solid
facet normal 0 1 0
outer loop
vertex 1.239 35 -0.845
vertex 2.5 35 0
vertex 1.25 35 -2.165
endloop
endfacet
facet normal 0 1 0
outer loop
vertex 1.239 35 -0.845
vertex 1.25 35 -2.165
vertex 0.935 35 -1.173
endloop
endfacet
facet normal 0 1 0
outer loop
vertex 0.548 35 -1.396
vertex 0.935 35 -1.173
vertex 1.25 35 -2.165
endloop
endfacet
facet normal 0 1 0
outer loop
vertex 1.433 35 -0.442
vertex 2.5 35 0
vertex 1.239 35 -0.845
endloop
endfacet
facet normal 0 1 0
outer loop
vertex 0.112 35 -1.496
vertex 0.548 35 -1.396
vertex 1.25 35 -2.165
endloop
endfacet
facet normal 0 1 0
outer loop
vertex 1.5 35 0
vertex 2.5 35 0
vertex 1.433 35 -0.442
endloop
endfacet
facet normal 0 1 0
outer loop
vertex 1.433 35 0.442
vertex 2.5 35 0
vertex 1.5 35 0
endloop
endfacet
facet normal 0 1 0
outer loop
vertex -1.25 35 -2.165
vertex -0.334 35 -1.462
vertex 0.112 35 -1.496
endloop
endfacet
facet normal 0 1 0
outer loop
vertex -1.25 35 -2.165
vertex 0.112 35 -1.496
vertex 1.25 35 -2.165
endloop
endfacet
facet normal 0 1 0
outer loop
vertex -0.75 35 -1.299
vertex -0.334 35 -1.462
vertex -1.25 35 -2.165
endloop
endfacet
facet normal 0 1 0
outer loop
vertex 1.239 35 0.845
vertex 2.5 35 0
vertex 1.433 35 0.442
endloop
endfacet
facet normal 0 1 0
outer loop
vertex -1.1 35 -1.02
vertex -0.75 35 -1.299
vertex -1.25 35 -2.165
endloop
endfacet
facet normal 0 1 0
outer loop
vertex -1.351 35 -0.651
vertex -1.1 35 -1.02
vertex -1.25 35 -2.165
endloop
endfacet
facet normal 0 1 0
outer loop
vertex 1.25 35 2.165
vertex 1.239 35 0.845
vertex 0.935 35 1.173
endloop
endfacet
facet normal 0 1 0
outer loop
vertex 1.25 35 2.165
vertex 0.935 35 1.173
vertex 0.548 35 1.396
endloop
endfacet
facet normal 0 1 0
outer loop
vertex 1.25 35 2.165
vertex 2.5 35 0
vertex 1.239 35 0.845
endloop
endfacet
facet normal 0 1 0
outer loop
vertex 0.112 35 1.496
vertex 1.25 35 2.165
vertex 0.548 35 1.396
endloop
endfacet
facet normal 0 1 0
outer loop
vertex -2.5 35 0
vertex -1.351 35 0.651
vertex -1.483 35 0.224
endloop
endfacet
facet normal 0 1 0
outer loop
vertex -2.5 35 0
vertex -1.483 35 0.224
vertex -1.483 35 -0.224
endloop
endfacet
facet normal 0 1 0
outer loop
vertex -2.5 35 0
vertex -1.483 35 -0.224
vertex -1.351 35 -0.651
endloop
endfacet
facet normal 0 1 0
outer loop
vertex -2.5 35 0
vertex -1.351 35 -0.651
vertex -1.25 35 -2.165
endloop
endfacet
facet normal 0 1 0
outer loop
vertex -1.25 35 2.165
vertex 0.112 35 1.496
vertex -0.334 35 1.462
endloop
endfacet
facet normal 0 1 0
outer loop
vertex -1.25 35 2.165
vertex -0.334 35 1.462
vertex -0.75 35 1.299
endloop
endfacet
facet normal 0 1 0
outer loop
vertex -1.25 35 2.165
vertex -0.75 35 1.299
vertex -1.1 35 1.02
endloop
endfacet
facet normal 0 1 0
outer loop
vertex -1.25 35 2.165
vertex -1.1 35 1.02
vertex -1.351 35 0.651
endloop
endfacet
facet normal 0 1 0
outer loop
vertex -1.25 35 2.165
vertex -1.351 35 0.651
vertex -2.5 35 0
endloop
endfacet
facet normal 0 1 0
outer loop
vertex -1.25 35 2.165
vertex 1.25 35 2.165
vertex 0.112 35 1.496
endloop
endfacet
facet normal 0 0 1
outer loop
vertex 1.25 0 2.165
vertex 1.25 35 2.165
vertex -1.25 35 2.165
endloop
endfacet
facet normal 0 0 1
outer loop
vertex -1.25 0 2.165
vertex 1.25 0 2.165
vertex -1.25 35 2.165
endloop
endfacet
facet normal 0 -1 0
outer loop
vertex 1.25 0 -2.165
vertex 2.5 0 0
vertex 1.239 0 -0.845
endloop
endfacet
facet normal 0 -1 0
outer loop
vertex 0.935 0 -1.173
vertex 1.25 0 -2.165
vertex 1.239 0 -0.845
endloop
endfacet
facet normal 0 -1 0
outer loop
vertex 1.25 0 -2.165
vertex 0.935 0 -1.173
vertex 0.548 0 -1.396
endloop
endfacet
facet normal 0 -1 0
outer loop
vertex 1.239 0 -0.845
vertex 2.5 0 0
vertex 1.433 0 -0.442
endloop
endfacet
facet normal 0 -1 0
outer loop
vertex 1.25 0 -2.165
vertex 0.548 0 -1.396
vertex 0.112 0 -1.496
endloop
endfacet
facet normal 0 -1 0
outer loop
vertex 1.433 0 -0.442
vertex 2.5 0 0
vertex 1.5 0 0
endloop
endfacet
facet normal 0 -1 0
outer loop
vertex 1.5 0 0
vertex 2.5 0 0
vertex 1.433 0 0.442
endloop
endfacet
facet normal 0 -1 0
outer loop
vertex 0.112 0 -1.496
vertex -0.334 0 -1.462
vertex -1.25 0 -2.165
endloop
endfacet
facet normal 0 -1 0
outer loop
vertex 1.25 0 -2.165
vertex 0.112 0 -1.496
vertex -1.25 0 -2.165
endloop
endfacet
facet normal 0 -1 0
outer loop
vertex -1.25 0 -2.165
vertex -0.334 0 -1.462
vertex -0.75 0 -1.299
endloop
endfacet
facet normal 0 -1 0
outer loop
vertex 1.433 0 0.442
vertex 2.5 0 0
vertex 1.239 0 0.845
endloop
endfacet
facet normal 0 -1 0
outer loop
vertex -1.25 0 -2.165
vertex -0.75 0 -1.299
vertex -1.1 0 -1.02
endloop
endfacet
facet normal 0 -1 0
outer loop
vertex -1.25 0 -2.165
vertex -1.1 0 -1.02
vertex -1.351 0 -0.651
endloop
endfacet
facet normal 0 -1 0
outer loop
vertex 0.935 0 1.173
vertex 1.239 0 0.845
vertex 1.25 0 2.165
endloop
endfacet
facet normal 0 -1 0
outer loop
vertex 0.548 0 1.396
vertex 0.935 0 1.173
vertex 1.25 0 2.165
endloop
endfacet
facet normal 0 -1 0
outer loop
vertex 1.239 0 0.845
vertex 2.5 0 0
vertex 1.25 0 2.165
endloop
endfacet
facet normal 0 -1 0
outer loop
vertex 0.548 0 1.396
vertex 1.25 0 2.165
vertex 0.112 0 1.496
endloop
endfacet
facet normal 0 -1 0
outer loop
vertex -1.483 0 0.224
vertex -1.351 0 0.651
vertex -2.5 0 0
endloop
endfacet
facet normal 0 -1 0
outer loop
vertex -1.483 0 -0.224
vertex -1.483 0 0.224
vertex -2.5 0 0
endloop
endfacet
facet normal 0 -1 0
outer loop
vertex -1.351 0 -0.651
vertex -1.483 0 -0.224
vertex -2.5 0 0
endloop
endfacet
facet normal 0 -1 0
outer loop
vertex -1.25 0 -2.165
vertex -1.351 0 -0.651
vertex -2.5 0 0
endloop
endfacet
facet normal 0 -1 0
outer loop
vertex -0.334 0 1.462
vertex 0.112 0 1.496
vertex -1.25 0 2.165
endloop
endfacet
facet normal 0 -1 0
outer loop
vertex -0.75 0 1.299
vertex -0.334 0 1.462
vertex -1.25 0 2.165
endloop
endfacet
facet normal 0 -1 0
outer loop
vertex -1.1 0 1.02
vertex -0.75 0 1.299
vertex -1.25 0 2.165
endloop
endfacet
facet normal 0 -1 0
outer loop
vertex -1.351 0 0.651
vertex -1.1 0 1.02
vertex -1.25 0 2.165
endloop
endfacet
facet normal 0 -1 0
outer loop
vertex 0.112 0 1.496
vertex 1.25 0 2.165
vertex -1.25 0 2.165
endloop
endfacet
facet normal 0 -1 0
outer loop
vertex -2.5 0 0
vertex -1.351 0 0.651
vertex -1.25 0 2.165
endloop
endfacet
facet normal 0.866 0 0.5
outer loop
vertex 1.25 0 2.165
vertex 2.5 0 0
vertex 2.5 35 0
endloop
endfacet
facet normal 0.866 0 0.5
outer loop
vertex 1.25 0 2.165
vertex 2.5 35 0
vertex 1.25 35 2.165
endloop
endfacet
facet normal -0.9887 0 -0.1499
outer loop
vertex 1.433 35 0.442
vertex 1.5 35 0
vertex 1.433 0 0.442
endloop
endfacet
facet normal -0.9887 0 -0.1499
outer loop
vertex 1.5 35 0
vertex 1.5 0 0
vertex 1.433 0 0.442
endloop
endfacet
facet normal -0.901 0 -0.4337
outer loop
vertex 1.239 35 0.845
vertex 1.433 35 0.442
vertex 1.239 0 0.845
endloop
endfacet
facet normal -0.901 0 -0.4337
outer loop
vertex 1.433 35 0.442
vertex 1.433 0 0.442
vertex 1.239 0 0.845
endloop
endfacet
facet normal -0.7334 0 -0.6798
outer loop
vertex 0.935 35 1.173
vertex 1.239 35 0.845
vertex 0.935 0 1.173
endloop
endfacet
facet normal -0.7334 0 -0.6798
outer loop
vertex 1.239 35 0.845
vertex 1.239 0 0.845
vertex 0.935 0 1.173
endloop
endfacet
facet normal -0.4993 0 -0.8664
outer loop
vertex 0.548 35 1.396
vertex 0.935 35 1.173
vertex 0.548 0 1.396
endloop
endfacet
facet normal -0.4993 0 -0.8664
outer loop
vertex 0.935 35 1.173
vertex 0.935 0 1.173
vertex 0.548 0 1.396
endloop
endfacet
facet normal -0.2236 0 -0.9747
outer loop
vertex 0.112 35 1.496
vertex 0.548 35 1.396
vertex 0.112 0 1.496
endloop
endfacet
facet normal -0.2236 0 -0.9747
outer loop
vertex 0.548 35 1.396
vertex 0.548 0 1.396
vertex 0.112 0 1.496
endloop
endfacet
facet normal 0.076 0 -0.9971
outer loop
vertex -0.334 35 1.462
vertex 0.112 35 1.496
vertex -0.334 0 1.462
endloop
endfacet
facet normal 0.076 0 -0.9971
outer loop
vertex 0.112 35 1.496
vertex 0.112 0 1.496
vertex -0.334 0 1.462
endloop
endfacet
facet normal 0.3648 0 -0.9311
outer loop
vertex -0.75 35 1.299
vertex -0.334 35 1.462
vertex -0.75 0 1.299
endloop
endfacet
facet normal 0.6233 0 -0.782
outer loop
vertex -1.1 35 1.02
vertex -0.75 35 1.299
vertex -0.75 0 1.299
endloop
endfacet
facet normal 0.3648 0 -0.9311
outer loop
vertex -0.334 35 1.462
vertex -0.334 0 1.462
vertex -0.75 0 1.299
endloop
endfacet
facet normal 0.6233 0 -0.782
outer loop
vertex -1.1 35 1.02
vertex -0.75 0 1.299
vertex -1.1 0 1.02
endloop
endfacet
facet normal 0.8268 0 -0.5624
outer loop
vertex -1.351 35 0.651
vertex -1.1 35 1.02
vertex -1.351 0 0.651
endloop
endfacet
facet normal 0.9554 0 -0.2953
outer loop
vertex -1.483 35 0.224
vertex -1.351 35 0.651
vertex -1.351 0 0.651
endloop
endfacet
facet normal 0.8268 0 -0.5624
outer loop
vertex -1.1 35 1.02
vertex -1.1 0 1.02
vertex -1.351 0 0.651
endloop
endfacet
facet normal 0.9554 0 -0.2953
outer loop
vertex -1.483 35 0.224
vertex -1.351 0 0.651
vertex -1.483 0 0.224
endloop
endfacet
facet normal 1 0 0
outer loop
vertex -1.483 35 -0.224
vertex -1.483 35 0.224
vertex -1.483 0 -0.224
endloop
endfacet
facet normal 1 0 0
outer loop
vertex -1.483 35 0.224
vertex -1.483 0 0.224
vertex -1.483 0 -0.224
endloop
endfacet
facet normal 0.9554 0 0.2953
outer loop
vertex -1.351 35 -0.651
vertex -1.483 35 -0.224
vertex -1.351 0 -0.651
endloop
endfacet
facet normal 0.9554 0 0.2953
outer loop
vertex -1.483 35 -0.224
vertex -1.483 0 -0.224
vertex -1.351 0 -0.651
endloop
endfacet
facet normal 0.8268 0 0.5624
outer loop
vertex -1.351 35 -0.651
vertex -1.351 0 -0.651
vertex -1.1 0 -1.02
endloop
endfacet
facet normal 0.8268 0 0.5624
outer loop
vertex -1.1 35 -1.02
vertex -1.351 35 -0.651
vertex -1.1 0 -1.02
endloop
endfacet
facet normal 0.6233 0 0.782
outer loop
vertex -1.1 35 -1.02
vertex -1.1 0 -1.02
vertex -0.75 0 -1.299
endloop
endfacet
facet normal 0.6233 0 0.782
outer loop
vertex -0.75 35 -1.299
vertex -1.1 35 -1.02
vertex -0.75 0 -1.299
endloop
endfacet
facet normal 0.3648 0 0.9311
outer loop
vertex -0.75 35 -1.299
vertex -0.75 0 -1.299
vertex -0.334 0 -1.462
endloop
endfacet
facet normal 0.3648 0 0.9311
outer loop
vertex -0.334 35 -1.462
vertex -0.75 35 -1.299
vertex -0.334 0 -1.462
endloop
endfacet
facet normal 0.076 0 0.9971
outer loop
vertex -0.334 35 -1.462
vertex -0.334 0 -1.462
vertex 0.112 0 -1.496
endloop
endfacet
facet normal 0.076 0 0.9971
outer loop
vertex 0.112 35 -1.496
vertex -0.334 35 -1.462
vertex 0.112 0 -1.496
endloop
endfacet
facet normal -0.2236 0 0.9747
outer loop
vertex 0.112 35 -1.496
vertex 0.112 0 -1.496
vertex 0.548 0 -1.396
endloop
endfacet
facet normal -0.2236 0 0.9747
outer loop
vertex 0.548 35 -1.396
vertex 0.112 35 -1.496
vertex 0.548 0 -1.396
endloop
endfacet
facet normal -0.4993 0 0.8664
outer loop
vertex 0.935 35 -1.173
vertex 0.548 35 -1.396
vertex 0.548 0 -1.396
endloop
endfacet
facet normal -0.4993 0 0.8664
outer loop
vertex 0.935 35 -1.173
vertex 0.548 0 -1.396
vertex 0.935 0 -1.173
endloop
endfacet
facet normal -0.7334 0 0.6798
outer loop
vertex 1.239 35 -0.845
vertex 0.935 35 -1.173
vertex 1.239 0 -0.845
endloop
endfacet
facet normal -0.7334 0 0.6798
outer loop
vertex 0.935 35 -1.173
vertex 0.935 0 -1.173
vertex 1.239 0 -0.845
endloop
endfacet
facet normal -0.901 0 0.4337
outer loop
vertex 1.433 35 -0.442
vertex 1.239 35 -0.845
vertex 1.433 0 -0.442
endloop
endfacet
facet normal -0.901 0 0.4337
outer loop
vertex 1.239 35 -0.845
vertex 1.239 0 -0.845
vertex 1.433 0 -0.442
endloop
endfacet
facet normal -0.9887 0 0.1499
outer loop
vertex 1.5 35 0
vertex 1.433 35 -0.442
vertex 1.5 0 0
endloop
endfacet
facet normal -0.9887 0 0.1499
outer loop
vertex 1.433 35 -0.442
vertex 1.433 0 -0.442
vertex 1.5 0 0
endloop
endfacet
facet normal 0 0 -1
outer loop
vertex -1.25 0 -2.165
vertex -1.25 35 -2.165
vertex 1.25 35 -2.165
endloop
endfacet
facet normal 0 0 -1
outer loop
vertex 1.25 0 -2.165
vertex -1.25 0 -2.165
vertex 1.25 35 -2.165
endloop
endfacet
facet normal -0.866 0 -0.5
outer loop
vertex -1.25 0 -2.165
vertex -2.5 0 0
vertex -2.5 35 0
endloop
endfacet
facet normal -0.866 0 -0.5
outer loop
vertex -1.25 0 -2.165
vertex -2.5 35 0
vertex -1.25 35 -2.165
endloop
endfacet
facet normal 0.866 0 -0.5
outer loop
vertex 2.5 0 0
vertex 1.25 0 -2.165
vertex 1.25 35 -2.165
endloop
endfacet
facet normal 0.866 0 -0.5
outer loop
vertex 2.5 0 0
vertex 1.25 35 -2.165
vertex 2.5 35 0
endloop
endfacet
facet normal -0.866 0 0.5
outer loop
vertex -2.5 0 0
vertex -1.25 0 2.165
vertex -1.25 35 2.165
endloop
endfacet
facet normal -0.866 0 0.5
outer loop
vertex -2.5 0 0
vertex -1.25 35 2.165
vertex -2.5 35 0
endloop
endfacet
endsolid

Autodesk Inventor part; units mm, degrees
ref_plane "YZ Plane" through (0, 0, 0) normal (1, 0, 0) x (0, 1, 0)
ref_plane "XZ Plane" through (0, 0, 0) normal (0, 1, 0) x (-1, 0, 0)
ref_plane "XY Plane" through (0, 0, 0) normal (0, 0, 1) x (1, 0, 0)
sketch "Эскиз1" plane through (0, 0, 0) normal (0, 1, 0) x (-1, 0, 0)
  circle A0 centre (0, 0) radius 2.5
  dimension "d0" = 5
extrude "Выдавливание1" add sketch "Эскиз1" along normal blind 35
sketch "Эскиз2" plane through (0, 35, 0) normal (0, 1, 0) x (1, 0, 0)
  circle A0 centre (0, 0) radius 2.5 projected
  line L0 (2.5, 0) -> (1.25, -2.1651)
  line L1 (1.25, -2.1651) -> (-1.25, -2.1651)
  line L2 (-1.25, -2.1651) -> (-2.5, 0)
  line L3 (-2.5, 0) -> (-1.25, 2.1651)
  line L4 (-1.25, 2.1651) -> (1.25, 2.1651)
  line L5 (1.25, 2.1651) -> (2.5, 0)
  point P0 (1.25, 2.1651)
  point P1 (1.25, 2.1651)
  point P2 (-2.5, 0)
  point P3 (-2.5, 0)
  point P4 (-1.25, -2.1651)
  point P5 (-1.25, -2.1651)
extrude "Выдавливание2" cut sketch "Эскиз2" against normal through all contours L5 A0 | A0 L0 | L4 A0 | A0 L1 | L3 A0 | A0 L2
sketch "Эскиз3" plane through (0, 0, 0) normal (0, -1, 0) x (1, 0, 0)
  circle A0 centre (0, 0) radius 1.5
  dimension "d5" = 3
extrude "Выдавливание3" cut sketch "Эскиз3" against normal through all
properties part number "Stoics"
